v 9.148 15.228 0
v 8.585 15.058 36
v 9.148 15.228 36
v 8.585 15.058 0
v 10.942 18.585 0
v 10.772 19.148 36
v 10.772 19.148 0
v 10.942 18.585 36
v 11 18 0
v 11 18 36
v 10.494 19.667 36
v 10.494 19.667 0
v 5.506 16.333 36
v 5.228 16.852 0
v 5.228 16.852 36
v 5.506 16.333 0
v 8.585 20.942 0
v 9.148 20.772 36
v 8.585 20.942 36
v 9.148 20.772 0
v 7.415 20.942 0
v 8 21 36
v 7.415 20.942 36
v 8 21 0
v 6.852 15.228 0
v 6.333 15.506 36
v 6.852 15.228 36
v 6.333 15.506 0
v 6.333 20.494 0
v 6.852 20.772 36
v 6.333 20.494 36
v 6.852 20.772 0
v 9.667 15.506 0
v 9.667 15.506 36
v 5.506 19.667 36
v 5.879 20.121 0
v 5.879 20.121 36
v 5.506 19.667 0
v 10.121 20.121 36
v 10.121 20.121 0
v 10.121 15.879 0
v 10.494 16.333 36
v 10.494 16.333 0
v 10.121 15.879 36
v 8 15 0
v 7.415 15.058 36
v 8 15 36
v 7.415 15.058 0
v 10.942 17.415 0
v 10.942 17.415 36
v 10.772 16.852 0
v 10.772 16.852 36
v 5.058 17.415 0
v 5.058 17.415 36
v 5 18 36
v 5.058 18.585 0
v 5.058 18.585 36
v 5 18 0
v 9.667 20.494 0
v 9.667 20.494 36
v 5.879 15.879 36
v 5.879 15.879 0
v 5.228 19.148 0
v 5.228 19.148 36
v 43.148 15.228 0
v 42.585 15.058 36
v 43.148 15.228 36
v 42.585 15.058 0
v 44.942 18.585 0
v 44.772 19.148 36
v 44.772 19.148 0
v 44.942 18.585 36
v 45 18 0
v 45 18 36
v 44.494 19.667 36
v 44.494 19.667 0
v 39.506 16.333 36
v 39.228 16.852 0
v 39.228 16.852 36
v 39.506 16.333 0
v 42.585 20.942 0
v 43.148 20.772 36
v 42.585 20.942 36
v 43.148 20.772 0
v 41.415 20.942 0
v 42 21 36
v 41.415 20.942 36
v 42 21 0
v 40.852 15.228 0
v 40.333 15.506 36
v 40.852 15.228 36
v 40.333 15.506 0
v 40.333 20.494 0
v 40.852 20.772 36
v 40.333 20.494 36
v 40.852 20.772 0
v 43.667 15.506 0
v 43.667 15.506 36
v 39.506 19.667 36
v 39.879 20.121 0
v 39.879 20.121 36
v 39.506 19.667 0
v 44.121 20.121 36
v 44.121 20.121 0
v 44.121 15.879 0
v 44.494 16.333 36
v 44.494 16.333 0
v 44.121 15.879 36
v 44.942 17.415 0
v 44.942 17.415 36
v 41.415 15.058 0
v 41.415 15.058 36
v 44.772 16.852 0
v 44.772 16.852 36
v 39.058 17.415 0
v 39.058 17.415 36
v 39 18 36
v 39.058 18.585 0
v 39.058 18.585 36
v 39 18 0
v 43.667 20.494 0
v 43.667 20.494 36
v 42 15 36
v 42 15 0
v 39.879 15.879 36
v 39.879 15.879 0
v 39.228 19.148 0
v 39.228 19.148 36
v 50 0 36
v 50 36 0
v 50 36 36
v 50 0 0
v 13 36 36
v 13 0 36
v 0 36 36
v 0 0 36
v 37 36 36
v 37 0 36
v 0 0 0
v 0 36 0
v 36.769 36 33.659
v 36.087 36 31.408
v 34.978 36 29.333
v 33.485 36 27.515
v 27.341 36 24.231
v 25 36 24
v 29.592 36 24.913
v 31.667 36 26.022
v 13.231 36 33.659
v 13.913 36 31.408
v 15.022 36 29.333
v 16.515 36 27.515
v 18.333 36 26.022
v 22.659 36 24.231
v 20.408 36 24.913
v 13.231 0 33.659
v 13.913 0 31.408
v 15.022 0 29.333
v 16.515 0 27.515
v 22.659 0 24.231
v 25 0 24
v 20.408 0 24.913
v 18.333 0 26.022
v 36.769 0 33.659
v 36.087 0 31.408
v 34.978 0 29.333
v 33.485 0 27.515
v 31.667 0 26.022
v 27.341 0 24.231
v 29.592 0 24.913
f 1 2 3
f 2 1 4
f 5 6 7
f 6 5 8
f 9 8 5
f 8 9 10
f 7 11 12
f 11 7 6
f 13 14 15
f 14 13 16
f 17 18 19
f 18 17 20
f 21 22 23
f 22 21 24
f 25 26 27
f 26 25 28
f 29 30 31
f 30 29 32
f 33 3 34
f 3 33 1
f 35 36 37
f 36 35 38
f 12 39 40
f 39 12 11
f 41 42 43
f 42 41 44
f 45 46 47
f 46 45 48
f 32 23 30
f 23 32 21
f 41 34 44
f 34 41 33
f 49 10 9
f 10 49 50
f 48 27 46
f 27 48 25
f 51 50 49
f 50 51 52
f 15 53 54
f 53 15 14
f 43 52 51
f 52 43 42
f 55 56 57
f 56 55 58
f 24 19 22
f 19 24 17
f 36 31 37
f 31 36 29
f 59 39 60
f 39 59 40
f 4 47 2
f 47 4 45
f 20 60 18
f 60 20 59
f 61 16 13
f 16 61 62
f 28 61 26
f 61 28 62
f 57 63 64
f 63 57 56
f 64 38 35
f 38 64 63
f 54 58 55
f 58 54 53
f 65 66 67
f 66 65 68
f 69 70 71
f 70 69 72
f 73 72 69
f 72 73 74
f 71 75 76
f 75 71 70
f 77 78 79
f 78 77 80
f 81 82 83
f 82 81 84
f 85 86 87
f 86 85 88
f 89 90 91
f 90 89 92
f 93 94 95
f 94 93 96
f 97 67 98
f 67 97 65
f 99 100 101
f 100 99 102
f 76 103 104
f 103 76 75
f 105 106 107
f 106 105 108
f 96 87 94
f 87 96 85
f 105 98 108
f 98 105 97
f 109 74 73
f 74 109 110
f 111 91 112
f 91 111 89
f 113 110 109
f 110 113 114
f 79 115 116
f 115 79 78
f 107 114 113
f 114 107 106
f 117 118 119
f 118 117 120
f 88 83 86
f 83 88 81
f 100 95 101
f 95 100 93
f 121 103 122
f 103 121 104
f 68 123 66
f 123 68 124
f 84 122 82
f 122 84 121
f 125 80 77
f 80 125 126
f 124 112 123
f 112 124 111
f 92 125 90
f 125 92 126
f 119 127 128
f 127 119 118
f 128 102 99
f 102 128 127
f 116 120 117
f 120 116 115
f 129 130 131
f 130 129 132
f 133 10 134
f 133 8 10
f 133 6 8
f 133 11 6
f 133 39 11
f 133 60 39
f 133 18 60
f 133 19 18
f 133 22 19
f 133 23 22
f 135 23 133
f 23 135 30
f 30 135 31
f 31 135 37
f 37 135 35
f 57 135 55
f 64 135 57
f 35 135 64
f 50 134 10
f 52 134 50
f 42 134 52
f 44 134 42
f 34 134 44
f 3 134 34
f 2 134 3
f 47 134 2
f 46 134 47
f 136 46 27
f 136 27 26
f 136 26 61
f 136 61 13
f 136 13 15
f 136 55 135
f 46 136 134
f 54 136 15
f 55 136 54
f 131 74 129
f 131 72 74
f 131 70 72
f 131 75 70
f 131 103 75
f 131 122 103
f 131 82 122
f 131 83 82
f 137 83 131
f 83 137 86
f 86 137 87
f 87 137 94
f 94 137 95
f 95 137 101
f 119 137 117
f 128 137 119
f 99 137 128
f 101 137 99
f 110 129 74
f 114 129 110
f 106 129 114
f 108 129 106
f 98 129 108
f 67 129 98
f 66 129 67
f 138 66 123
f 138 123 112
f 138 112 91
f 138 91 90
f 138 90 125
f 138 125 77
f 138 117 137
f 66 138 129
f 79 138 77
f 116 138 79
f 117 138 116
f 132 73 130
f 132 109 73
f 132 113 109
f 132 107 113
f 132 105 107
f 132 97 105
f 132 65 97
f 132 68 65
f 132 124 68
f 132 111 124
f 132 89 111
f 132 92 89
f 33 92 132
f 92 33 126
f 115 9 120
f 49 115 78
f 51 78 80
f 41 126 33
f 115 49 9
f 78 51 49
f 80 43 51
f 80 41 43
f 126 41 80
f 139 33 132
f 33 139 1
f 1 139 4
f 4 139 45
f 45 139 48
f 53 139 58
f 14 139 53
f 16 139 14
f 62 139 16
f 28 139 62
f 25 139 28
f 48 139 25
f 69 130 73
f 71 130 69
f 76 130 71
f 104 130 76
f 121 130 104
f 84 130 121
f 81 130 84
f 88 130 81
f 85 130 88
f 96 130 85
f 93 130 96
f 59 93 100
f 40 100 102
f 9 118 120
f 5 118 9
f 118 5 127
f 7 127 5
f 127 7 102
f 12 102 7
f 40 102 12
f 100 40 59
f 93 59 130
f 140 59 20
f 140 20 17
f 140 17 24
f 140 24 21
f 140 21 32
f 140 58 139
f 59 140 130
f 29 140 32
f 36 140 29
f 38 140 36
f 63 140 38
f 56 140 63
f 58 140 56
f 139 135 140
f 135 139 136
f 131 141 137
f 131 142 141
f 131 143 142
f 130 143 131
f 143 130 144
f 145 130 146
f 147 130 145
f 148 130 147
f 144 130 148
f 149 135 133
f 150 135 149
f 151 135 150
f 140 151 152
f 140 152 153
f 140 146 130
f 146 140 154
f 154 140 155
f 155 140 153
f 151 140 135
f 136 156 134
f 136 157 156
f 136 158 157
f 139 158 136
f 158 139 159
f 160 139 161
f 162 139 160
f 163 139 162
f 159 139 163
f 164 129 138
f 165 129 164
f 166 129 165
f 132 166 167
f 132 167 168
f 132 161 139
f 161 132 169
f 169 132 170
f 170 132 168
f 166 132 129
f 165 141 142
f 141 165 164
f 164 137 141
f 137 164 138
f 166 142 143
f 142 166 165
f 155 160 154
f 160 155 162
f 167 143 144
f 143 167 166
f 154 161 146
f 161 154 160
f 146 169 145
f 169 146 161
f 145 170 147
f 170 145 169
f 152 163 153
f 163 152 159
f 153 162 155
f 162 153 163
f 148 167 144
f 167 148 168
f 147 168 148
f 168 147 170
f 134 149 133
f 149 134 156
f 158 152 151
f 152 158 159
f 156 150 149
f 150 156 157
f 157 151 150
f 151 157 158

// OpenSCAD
$fn = 32;

// ----------------------------------------------------------------------
// Saddle clamp: plain shaft clamp
// ----------------------------------------------------------------------

// --- parameters (mm) ---
blk_l = 50;               // block length, X
blk_w = 36;               // block width, Y
blk_h = 36;               // block height
clamp_r = 12;             // shaft groove radius
hole_r = 3;               // bolt hole radius
hole_m = 8;               // bolt hole margin from the ends
fit_tol = 0.05;           // tolerance for press fits, mm
free_tol = 0.2;           // tolerance for clearance fits, mm

saw_depth = clamp_r + 3;  // saw kerf depth

difference() {
  cube([blk_l, blk_w, blk_h]);
  translate([blk_l / 2, -1, blk_h])
    rotate([-90, 0, 0])
      cylinder(h = blk_w + 2, r = clamp_r);
  for (sx = [0, 1])
    translate([sx ? blk_l - hole_m : hole_m, blk_w / 2, -1])
      cylinder(r = hole_r, h = blk_h + 2);
}
